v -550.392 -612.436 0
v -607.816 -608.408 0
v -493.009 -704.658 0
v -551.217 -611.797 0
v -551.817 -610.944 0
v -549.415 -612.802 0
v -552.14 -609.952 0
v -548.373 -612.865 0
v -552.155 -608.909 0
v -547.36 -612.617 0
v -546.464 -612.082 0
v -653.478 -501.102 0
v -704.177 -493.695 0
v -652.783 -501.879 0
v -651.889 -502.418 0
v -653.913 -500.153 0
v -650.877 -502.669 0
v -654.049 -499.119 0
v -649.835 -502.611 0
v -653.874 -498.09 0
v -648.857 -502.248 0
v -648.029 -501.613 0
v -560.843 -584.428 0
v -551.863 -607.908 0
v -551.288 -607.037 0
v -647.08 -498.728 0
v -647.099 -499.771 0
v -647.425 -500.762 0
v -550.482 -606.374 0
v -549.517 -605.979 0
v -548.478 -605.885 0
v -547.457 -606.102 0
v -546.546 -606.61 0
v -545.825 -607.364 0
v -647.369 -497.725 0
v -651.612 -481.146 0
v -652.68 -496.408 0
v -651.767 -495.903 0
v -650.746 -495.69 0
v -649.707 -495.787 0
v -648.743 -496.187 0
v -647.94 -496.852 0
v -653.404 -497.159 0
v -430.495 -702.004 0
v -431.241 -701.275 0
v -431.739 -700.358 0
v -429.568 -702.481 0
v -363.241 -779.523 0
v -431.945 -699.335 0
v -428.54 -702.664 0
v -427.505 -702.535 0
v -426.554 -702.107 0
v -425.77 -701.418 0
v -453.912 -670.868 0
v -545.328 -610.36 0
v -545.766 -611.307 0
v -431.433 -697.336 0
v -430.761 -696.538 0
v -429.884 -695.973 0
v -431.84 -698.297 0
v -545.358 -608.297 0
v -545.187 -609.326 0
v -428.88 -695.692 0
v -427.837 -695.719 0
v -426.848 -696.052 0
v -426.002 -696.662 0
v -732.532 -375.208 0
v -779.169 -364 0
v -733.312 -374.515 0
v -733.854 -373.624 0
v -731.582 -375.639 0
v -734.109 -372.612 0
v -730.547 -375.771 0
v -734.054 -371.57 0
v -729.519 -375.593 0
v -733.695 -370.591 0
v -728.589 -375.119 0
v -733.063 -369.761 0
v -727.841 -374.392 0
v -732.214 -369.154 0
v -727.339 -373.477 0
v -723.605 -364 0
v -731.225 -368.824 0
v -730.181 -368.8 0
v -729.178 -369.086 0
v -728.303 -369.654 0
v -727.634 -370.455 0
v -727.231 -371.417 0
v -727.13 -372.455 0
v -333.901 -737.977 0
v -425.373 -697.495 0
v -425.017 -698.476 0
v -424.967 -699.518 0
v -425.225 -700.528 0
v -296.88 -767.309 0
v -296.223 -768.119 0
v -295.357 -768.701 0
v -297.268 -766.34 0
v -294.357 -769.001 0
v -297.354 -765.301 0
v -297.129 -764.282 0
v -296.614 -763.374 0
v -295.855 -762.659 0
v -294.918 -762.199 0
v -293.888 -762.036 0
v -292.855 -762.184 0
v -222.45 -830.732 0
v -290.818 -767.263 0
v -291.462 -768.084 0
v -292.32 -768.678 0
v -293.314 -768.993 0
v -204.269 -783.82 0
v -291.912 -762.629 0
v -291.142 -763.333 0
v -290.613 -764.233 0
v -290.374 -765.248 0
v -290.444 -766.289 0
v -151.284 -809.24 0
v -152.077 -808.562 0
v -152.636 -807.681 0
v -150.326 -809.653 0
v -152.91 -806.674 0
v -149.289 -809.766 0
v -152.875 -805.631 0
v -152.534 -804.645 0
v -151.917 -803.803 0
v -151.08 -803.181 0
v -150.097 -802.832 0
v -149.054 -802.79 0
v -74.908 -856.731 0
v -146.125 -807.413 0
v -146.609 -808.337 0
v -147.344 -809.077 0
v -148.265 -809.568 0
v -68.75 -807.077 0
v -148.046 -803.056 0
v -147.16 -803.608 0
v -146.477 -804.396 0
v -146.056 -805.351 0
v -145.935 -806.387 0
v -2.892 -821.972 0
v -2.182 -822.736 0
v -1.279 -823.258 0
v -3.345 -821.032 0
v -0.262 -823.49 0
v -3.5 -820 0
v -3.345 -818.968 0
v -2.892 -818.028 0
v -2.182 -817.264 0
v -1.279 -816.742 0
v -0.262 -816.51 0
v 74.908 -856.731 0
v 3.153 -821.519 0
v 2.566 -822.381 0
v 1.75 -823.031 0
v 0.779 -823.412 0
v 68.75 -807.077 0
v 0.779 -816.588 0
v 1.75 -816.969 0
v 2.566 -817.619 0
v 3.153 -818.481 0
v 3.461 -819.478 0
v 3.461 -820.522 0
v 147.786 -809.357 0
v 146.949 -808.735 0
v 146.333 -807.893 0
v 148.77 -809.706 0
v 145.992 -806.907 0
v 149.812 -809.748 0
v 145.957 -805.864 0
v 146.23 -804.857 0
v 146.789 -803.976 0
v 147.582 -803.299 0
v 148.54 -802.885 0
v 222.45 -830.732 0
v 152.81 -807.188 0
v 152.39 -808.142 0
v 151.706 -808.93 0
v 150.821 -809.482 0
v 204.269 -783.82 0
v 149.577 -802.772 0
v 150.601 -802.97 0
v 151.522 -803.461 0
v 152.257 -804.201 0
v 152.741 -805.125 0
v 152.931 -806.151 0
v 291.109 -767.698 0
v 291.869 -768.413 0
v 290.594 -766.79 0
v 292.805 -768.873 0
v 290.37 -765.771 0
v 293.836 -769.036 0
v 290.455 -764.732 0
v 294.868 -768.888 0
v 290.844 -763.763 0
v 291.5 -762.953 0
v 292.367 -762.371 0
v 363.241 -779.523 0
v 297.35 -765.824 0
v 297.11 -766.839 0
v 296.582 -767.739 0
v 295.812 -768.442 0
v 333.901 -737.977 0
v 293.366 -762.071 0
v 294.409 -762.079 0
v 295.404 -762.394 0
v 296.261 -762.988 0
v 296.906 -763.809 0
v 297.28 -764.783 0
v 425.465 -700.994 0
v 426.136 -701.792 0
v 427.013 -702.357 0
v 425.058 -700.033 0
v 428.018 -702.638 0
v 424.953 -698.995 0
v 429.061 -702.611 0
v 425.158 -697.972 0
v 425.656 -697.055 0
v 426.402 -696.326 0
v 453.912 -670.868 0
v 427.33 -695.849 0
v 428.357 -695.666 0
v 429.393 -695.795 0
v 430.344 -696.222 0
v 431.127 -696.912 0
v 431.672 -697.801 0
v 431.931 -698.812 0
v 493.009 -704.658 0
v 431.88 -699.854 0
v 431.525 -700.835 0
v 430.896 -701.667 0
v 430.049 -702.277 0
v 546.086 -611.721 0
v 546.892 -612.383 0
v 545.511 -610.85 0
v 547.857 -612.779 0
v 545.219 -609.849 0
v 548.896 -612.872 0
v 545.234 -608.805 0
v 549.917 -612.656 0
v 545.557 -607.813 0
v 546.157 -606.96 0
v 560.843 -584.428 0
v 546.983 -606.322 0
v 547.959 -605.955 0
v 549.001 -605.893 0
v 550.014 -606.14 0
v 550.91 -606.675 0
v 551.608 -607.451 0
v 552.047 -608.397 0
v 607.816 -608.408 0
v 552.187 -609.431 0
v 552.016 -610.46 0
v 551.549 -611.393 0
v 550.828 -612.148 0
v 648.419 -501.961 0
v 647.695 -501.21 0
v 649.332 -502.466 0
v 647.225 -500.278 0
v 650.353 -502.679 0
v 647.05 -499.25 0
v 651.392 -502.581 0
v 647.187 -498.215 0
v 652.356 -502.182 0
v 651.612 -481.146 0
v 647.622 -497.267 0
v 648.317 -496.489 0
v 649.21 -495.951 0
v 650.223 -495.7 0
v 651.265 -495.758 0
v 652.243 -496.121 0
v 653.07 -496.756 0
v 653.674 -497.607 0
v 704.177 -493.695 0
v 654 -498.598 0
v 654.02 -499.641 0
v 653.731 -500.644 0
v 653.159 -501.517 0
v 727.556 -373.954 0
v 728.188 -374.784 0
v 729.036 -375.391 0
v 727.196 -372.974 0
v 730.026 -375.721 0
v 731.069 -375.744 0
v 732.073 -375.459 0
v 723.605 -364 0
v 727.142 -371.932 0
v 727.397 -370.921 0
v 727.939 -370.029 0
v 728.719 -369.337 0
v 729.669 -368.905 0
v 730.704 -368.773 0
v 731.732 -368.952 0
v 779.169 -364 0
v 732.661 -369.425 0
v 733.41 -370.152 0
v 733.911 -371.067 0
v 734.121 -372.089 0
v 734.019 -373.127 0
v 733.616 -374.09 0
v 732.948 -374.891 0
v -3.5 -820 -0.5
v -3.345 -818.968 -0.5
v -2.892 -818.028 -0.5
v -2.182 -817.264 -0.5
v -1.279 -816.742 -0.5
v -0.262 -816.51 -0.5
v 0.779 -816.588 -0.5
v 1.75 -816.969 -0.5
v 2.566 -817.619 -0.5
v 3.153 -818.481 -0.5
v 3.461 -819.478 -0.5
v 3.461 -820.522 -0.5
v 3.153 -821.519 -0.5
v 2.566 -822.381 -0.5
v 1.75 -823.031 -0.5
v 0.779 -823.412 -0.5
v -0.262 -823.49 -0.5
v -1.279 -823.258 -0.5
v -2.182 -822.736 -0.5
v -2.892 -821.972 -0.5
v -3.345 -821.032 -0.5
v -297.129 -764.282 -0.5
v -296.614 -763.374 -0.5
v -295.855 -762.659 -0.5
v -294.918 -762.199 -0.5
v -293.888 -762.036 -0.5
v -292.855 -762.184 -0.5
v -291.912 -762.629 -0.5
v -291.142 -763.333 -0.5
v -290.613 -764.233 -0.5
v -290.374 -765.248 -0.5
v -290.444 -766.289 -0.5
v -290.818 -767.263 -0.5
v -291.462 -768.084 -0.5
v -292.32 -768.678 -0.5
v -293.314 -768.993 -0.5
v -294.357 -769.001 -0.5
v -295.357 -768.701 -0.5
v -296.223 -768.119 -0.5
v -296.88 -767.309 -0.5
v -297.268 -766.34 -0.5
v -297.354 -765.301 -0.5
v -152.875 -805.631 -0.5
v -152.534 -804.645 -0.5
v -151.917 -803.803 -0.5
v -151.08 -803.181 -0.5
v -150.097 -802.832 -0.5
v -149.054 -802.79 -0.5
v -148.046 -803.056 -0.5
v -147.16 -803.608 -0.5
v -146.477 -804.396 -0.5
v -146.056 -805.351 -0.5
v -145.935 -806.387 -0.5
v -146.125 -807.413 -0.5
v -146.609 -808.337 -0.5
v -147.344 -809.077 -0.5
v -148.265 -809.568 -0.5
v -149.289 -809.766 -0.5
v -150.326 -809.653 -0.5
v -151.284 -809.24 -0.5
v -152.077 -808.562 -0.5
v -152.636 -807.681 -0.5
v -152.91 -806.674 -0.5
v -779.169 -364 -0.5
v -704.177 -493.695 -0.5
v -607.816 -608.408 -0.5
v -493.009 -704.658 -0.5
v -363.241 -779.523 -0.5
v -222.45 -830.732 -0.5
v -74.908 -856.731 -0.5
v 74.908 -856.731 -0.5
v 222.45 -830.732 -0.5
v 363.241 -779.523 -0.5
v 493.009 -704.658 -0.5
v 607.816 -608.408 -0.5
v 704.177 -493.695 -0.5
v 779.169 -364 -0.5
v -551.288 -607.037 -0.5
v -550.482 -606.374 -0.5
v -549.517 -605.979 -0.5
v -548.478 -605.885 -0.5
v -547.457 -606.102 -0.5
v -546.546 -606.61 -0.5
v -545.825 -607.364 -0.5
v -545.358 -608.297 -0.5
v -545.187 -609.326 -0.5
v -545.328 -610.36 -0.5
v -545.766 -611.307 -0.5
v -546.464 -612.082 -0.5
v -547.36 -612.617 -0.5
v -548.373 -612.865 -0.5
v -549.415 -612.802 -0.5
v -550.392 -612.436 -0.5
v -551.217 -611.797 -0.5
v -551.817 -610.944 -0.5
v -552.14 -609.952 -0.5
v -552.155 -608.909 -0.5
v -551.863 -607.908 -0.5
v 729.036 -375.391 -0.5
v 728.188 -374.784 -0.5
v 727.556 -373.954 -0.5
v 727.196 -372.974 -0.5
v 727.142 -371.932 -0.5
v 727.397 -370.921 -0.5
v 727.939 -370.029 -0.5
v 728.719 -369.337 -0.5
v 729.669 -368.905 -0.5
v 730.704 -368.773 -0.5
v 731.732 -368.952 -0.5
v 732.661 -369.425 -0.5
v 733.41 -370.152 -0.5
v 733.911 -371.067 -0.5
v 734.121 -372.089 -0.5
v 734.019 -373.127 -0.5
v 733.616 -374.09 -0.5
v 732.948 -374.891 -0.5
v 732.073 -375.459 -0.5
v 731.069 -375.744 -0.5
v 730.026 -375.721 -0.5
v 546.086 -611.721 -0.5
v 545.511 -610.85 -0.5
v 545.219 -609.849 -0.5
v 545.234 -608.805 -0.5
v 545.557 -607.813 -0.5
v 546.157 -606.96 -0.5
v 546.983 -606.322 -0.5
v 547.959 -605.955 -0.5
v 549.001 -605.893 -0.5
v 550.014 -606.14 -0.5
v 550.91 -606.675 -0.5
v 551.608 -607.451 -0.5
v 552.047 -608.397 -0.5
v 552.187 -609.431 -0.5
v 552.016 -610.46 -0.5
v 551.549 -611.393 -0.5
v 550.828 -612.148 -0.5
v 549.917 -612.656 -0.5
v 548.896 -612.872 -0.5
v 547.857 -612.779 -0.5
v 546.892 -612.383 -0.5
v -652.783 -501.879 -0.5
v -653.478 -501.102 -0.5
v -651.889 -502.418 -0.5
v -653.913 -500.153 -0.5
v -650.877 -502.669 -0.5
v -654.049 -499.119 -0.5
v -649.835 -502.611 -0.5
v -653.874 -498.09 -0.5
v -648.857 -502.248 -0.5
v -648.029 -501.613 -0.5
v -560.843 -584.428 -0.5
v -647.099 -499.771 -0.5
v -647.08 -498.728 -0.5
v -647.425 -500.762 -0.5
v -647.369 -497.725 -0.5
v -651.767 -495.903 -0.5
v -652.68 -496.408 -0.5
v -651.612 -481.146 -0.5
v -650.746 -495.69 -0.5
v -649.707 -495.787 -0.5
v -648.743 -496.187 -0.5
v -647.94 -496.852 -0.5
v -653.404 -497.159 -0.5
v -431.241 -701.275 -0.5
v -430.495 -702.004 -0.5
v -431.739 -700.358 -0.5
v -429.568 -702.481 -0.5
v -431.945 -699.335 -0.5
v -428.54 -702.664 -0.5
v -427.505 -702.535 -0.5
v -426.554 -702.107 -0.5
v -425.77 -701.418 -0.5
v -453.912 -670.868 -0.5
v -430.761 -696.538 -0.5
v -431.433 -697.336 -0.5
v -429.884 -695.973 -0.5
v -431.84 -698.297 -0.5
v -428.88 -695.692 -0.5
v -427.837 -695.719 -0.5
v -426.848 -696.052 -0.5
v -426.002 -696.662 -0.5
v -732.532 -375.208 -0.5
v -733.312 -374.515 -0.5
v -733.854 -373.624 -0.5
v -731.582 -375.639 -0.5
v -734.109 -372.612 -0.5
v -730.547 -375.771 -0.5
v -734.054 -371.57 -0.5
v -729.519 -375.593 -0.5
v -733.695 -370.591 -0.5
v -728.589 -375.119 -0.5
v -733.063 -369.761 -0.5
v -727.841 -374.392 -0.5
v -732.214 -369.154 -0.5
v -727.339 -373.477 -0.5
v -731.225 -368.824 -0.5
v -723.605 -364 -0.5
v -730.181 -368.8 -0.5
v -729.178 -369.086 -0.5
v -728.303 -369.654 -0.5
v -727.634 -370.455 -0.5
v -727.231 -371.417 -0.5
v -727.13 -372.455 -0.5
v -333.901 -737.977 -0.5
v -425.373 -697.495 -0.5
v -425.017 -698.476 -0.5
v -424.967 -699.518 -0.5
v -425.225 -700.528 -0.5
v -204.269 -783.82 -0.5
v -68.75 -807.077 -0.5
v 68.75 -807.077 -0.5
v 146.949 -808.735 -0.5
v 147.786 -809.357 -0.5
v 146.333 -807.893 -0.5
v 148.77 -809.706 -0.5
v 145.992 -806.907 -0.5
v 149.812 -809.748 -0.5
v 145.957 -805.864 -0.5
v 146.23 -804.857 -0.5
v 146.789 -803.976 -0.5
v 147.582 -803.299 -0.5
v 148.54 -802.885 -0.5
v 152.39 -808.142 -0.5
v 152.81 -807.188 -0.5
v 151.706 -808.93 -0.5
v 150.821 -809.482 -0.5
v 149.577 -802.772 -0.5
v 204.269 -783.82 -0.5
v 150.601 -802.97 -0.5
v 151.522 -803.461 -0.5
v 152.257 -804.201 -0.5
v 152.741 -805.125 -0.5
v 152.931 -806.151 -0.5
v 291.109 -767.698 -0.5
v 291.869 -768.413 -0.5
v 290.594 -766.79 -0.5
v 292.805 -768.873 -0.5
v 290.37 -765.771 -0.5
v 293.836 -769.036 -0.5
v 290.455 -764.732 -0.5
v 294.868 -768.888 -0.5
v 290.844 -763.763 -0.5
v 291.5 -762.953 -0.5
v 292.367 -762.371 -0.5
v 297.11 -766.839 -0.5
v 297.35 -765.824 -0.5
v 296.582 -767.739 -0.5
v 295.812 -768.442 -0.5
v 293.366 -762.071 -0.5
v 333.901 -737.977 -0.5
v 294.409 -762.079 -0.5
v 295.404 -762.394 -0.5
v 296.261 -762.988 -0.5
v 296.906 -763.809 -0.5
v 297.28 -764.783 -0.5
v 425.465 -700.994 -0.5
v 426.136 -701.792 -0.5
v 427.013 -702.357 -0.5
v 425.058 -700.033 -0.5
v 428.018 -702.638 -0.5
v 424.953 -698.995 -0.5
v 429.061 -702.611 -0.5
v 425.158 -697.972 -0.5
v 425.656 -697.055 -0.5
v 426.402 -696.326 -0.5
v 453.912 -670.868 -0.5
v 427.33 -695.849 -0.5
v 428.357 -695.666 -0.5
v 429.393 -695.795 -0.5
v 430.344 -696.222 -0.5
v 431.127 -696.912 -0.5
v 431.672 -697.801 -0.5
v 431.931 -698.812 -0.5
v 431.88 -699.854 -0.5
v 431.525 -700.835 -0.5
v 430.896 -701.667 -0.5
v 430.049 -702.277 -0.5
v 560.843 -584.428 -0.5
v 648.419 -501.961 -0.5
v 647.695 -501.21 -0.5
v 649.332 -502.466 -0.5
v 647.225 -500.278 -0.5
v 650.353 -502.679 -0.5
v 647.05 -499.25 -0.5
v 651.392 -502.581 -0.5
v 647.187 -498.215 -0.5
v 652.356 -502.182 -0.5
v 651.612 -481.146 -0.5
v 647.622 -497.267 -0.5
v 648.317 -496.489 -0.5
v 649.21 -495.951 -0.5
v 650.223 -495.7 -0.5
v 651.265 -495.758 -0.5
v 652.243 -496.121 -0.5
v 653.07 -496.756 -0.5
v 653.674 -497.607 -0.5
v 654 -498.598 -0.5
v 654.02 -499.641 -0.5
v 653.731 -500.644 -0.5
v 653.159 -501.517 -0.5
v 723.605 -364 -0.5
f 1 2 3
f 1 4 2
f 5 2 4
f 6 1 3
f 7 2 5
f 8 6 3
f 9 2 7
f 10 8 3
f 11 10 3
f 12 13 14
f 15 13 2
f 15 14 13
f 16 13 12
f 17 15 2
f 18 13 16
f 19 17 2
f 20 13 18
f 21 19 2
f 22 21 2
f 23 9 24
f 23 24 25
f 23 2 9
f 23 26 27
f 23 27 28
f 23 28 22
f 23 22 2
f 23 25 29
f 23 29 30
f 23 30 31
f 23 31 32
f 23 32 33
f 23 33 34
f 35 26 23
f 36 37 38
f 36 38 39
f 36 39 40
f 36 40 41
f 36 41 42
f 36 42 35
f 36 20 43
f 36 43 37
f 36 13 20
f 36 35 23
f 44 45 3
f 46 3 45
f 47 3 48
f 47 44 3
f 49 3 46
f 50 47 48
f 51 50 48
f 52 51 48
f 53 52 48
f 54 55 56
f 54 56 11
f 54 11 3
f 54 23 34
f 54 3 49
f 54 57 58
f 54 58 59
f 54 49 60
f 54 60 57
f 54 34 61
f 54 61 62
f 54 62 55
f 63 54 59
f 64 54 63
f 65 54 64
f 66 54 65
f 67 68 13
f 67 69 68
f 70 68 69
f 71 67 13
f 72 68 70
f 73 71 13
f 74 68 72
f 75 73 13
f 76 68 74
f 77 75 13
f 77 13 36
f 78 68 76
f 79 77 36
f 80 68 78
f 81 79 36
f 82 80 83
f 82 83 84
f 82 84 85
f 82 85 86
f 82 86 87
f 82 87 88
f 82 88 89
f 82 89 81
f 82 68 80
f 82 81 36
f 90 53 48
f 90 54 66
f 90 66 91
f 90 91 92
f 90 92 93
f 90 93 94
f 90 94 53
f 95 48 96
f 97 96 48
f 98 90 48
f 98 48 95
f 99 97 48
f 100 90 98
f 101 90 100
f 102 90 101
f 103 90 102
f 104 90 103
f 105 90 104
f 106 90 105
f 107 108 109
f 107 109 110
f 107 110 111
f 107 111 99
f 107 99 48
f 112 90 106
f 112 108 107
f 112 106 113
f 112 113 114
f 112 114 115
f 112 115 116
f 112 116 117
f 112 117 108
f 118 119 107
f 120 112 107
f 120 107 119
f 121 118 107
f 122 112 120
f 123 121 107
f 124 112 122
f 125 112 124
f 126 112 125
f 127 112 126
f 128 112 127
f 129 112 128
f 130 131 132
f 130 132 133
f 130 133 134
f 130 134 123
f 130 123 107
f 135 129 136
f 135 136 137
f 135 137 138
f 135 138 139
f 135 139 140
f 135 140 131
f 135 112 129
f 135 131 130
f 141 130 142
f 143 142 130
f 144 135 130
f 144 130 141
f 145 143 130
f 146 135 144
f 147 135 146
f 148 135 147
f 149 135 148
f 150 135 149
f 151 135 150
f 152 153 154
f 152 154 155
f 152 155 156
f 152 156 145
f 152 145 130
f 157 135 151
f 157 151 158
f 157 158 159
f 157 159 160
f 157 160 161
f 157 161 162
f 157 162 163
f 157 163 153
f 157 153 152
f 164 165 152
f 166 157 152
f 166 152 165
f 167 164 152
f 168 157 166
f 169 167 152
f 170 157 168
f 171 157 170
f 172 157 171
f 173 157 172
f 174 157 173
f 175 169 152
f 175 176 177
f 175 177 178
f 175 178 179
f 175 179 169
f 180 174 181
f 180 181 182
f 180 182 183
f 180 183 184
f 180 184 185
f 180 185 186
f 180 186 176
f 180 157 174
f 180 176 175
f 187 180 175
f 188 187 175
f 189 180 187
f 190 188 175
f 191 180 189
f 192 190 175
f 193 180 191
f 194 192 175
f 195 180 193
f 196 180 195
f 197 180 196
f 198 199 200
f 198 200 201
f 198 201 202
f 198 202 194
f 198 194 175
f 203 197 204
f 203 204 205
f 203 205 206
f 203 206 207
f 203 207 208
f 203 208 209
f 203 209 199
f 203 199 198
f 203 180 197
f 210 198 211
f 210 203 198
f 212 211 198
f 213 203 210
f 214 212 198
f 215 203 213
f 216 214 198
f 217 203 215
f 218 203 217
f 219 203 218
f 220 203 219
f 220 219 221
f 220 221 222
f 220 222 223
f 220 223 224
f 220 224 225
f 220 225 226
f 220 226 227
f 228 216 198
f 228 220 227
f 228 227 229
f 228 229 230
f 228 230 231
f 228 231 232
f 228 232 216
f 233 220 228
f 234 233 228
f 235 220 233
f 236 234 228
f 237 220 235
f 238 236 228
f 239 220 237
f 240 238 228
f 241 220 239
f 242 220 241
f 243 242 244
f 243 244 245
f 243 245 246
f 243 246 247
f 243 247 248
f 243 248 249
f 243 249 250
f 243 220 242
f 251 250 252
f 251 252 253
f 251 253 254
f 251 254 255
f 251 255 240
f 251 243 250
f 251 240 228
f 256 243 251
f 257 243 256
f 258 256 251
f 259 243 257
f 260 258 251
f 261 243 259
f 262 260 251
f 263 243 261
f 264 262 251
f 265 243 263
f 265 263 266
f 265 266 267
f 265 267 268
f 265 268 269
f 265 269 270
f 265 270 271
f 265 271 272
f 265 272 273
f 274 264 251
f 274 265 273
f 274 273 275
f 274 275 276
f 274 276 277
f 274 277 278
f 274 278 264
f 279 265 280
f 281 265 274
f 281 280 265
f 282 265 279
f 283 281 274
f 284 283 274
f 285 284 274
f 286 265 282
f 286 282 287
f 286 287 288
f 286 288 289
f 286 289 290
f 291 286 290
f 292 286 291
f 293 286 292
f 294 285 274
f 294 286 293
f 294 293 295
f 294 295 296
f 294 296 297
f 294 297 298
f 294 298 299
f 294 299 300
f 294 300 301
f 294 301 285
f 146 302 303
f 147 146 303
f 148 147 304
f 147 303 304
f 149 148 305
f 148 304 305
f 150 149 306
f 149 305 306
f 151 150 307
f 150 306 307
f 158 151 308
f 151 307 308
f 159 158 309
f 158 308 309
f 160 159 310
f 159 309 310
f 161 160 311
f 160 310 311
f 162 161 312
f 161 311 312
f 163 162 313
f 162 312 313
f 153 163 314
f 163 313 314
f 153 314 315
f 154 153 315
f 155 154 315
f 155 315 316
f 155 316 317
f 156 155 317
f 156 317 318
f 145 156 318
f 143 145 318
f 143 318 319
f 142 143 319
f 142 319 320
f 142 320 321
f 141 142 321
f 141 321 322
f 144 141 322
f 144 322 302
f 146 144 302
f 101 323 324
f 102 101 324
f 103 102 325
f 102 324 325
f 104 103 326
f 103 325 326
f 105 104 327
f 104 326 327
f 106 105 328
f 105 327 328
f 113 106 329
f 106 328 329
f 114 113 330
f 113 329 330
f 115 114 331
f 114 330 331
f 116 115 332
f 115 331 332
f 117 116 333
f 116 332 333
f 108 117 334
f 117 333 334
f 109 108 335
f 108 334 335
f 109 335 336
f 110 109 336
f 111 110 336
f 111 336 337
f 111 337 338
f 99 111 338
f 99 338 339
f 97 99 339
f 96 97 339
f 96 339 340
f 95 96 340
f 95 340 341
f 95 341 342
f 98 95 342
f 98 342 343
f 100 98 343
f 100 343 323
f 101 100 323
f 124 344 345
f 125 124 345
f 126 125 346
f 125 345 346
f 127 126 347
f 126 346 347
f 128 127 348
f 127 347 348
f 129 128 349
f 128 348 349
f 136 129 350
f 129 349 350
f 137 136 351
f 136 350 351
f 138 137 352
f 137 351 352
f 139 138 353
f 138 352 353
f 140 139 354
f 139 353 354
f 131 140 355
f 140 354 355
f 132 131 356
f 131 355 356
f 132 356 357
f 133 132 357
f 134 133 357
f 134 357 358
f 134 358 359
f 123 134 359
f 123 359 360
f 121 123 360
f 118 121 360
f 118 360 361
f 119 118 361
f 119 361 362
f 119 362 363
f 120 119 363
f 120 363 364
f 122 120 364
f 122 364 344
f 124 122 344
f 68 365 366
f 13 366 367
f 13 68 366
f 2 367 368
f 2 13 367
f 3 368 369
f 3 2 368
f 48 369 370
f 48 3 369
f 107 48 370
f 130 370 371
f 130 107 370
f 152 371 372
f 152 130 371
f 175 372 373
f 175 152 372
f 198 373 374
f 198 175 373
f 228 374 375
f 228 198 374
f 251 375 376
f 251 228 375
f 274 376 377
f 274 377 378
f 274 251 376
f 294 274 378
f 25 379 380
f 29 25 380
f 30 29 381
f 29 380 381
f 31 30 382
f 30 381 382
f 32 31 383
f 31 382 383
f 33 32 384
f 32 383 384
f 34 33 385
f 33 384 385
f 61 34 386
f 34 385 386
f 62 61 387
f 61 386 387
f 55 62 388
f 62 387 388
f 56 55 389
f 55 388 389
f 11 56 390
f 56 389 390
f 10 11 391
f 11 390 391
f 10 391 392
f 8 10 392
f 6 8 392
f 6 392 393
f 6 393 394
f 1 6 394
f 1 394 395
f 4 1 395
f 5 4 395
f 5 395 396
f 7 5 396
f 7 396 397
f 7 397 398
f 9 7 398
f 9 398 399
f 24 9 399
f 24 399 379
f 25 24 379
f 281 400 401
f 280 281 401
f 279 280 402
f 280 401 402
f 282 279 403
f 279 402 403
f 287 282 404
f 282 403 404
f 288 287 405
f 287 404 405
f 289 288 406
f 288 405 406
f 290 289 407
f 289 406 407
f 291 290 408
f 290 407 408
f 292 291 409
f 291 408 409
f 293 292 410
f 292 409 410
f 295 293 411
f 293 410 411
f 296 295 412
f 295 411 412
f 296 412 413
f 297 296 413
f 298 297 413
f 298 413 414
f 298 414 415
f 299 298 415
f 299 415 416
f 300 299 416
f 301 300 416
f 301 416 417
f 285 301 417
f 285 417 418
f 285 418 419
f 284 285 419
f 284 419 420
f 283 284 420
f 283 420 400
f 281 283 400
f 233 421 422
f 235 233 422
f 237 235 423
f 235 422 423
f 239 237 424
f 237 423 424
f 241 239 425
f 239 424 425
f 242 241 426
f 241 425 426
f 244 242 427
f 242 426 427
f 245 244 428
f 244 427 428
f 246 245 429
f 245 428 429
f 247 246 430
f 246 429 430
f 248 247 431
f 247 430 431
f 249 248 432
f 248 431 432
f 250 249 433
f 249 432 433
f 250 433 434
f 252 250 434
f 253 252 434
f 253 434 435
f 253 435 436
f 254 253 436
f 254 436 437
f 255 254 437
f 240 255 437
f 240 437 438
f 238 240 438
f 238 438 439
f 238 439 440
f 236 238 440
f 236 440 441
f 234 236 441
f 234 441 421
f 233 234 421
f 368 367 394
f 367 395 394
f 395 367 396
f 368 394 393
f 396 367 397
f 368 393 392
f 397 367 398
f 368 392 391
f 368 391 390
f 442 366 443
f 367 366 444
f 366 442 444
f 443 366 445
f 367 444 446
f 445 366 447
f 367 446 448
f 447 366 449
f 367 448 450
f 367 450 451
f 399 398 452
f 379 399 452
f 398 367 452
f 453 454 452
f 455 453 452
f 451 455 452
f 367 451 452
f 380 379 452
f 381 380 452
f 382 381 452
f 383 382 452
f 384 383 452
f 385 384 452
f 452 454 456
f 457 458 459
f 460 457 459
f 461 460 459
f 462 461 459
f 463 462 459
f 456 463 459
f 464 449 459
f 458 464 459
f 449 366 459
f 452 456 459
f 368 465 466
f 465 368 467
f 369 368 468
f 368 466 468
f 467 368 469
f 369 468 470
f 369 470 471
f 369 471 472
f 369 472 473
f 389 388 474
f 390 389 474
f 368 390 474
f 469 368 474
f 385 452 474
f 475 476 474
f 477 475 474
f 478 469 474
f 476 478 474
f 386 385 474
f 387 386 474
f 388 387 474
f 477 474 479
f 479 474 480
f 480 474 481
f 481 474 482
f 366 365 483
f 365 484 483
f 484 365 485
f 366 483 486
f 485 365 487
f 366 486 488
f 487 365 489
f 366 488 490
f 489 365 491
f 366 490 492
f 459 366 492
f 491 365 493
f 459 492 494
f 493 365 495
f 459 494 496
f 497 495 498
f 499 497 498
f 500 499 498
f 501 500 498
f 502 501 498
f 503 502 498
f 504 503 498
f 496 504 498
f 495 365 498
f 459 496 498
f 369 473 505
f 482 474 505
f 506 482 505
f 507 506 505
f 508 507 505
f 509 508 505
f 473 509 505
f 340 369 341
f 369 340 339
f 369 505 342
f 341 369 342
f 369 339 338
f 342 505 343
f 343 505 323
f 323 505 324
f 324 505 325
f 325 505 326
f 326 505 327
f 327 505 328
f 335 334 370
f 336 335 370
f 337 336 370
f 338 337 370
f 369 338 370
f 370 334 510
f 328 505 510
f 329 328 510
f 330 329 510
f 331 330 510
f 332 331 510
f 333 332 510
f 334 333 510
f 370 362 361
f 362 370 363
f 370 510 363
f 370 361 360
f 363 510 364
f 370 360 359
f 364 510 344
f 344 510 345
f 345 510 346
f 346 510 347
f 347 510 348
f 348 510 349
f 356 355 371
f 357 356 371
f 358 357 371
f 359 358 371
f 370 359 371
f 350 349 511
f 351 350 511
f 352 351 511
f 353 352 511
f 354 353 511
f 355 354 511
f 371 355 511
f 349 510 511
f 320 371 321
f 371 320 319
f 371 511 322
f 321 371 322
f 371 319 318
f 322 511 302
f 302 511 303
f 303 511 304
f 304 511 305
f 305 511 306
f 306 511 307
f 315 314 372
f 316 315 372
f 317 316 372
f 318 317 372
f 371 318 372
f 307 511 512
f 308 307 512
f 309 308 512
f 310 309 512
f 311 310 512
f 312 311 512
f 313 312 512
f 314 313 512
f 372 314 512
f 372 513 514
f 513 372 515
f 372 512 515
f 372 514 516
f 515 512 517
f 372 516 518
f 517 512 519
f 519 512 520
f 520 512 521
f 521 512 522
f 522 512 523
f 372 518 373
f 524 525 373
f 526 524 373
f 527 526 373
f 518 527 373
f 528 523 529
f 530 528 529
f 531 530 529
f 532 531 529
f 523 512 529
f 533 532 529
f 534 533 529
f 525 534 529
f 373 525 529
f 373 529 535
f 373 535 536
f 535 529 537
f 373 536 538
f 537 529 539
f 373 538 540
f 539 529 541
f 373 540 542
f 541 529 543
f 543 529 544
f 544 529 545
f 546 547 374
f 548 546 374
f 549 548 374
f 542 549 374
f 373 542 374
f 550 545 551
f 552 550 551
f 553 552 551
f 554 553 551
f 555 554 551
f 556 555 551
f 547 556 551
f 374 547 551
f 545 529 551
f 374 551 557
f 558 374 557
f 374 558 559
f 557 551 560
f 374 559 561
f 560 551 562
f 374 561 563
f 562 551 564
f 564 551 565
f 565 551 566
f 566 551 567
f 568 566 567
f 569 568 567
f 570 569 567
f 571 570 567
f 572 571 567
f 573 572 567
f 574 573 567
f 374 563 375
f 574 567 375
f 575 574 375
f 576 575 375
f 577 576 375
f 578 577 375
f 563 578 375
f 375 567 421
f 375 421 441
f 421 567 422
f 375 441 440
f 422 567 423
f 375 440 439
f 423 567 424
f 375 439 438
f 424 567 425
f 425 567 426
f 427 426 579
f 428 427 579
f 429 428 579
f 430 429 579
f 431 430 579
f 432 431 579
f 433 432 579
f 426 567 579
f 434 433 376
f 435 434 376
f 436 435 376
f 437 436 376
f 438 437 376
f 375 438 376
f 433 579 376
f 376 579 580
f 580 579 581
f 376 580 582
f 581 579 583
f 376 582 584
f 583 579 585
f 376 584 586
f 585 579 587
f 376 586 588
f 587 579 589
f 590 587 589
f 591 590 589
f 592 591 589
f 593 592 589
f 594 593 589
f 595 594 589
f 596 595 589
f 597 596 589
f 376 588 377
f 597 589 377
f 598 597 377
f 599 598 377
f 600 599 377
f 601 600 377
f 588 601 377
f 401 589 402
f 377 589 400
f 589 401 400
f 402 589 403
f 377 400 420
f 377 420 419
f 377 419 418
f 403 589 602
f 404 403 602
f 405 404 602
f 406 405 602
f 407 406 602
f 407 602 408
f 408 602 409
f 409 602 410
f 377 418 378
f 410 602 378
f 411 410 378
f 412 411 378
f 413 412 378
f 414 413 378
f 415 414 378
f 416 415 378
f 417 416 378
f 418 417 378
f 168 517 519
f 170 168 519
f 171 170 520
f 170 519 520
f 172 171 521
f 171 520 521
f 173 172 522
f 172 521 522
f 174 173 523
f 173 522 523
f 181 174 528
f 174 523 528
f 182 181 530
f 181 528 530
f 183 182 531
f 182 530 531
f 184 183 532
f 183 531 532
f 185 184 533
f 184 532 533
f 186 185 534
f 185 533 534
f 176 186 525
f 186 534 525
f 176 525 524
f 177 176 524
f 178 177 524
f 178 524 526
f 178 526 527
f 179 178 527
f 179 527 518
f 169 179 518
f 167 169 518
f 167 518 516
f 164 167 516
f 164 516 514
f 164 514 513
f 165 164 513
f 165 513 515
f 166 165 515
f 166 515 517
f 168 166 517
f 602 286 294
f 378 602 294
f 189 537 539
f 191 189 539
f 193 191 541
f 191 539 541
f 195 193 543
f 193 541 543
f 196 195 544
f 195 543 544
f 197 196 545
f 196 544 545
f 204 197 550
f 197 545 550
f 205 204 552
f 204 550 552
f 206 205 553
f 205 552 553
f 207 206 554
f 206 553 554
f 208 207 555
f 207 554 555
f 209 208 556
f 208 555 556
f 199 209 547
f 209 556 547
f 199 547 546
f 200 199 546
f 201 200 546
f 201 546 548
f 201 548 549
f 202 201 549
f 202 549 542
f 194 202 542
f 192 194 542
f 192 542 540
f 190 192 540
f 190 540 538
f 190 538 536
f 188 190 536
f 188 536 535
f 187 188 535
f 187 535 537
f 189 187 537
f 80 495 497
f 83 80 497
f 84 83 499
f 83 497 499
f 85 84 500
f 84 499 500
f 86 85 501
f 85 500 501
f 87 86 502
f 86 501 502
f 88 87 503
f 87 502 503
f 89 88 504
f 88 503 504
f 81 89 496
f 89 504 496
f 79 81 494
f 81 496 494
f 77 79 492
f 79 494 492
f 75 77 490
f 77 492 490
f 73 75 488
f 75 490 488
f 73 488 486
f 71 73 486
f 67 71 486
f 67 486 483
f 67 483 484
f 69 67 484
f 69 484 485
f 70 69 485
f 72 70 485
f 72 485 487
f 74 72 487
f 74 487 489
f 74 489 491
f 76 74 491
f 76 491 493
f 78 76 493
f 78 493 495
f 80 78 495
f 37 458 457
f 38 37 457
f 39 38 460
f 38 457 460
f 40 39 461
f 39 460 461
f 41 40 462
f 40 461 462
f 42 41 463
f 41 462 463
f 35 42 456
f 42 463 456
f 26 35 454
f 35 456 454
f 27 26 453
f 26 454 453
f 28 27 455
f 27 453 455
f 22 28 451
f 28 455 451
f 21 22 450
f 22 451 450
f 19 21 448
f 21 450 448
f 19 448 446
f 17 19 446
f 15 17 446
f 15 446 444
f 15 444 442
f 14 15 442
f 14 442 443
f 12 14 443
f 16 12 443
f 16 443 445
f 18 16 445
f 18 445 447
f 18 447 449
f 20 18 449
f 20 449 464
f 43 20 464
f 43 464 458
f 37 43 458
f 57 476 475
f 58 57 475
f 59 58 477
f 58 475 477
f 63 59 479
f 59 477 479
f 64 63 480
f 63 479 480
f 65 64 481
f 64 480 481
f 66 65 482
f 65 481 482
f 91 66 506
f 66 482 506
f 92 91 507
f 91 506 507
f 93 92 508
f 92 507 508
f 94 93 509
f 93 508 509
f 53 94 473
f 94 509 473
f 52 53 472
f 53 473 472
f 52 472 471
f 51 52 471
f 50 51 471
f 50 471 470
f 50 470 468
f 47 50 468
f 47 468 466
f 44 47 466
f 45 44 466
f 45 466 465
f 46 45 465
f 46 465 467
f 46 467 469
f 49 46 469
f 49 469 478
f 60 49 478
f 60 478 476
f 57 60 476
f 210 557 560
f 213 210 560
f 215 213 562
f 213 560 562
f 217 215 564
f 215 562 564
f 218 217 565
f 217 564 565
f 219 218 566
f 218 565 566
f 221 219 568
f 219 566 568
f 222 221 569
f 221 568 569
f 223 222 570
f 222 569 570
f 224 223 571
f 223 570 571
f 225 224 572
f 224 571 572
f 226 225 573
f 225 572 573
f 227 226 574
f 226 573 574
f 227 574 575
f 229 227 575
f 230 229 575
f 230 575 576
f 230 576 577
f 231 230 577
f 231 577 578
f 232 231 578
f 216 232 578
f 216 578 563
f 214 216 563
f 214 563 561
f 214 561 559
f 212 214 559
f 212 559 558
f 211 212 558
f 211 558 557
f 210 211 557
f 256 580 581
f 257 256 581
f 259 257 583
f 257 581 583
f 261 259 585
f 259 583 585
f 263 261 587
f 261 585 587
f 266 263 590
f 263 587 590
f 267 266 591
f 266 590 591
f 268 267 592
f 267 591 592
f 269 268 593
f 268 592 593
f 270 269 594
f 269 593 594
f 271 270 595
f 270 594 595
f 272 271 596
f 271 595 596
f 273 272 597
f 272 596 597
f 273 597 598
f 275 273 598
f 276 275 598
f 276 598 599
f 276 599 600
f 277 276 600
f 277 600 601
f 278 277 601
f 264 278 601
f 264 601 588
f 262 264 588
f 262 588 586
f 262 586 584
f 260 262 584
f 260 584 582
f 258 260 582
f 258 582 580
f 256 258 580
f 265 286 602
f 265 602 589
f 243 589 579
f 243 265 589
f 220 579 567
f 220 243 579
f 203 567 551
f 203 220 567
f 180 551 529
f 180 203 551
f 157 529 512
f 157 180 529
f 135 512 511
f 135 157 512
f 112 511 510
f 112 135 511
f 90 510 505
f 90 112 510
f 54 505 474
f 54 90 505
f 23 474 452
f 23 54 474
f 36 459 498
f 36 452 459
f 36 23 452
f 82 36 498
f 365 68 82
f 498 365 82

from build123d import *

# Parameters (mm, degrees)
BASE_FLANGE1_DEPTH              = 0.5
SKETCH2_W                       = 1968.518691842
SKETCH2_H                       = 782.123286761
CUT_EXTRUDE1_DEPTH              = 10
CUT_EXTRUDE3_DEPTH              = 10
SKETCH10_R                      = 3.5
CUT_EXTRUDE4_DEPTH              = 10
CIRPATTERN1_COUNT               = 10
CIRPATTERN1_ANGLE               = 94.5
CIRPATTERN1_THE_OTHER_WAY_COUNT = 10
CIRPATTERN1_THE_OTHER_WAY_ANGLE = 94.5


# Sheet-metal steps are written as plain solids
with BuildPart() as part:
    # Sketch1 → Base-Flange1 (new body)
    with BuildSketch(Plane.XY):
        with BuildLine():
            Line((859.985464993, -5), (-859.985464993, -5))
            ThreePointArc((-859.985464993, -5), (0, -860), (859.985464993, -5))
        make_face()
    extrude(amount=-BASE_FLANGE1_DEPTH)

    # Sketch2 → Cut-Extrude1 (cut)
    with BuildSketch(Plane.XY):
        with Locations((10.387961435, 27.061643381)):
            Rectangle(SKETCH2_W, SKETCH2_H)
    extrude(amount=-CUT_EXTRUDE1_DEPTH, mode=Mode.SUBTRACT)

    # Sketch9 → Cut-Extrude3 (cut)
    with BuildSketch(Plane.XY):
        with BuildLine():
            Line((-723.60486455, -364), (723.60486455, -364))
            ThreePointArc((723.60486455, -364), (0, -810), (-723.60486455, -364))
        make_face()
    extrude(amount=-CUT_EXTRUDE3_DEPTH, mode=Mode.SUBTRACT)

    # Sketch10 → Cut-Extrude4 (cut)
    with BuildSketch(Plane(origin=(0, 0, -0.5), x_dir=(-1, 0, 0), z_dir=(0, 0, -1))):
        with Locations((0, -820)):
            Circle(SKETCH10_R)
    cut_extrude4 = extrude(amount=-CUT_EXTRUDE4_DEPTH, mode=Mode.SUBTRACT)

    # CirPattern1: Cut-Extrude4 ×10 about axis
    cirpattern1_axis = Axis((0, 0, 0), (0, 0, 1))
    for i in range(1, CIRPATTERN1_COUNT):
        add(cut_extrude4.rotate(cirpattern1_axis, i * CIRPATTERN1_ANGLE / (CIRPATTERN1_COUNT - 1)), mode=Mode.SUBTRACT)

    # CirPattern1 the other way: Cut-Extrude4 ×10 about axis
    cirpattern1_the_other_way_axis = Axis((0, 0, 0), (0, 0, -1))
    for i in range(1, CIRPATTERN1_THE_OTHER_WAY_COUNT):
        add(cut_extrude4.rotate(cirpattern1_the_other_way_axis, i * CIRPATTERN1_THE_OTHER_WAY_ANGLE / (CIRPATTERN1_THE_OTHER_WAY_COUNT - 1)), mode=Mode.SUBTRACT)


solid = part.part
